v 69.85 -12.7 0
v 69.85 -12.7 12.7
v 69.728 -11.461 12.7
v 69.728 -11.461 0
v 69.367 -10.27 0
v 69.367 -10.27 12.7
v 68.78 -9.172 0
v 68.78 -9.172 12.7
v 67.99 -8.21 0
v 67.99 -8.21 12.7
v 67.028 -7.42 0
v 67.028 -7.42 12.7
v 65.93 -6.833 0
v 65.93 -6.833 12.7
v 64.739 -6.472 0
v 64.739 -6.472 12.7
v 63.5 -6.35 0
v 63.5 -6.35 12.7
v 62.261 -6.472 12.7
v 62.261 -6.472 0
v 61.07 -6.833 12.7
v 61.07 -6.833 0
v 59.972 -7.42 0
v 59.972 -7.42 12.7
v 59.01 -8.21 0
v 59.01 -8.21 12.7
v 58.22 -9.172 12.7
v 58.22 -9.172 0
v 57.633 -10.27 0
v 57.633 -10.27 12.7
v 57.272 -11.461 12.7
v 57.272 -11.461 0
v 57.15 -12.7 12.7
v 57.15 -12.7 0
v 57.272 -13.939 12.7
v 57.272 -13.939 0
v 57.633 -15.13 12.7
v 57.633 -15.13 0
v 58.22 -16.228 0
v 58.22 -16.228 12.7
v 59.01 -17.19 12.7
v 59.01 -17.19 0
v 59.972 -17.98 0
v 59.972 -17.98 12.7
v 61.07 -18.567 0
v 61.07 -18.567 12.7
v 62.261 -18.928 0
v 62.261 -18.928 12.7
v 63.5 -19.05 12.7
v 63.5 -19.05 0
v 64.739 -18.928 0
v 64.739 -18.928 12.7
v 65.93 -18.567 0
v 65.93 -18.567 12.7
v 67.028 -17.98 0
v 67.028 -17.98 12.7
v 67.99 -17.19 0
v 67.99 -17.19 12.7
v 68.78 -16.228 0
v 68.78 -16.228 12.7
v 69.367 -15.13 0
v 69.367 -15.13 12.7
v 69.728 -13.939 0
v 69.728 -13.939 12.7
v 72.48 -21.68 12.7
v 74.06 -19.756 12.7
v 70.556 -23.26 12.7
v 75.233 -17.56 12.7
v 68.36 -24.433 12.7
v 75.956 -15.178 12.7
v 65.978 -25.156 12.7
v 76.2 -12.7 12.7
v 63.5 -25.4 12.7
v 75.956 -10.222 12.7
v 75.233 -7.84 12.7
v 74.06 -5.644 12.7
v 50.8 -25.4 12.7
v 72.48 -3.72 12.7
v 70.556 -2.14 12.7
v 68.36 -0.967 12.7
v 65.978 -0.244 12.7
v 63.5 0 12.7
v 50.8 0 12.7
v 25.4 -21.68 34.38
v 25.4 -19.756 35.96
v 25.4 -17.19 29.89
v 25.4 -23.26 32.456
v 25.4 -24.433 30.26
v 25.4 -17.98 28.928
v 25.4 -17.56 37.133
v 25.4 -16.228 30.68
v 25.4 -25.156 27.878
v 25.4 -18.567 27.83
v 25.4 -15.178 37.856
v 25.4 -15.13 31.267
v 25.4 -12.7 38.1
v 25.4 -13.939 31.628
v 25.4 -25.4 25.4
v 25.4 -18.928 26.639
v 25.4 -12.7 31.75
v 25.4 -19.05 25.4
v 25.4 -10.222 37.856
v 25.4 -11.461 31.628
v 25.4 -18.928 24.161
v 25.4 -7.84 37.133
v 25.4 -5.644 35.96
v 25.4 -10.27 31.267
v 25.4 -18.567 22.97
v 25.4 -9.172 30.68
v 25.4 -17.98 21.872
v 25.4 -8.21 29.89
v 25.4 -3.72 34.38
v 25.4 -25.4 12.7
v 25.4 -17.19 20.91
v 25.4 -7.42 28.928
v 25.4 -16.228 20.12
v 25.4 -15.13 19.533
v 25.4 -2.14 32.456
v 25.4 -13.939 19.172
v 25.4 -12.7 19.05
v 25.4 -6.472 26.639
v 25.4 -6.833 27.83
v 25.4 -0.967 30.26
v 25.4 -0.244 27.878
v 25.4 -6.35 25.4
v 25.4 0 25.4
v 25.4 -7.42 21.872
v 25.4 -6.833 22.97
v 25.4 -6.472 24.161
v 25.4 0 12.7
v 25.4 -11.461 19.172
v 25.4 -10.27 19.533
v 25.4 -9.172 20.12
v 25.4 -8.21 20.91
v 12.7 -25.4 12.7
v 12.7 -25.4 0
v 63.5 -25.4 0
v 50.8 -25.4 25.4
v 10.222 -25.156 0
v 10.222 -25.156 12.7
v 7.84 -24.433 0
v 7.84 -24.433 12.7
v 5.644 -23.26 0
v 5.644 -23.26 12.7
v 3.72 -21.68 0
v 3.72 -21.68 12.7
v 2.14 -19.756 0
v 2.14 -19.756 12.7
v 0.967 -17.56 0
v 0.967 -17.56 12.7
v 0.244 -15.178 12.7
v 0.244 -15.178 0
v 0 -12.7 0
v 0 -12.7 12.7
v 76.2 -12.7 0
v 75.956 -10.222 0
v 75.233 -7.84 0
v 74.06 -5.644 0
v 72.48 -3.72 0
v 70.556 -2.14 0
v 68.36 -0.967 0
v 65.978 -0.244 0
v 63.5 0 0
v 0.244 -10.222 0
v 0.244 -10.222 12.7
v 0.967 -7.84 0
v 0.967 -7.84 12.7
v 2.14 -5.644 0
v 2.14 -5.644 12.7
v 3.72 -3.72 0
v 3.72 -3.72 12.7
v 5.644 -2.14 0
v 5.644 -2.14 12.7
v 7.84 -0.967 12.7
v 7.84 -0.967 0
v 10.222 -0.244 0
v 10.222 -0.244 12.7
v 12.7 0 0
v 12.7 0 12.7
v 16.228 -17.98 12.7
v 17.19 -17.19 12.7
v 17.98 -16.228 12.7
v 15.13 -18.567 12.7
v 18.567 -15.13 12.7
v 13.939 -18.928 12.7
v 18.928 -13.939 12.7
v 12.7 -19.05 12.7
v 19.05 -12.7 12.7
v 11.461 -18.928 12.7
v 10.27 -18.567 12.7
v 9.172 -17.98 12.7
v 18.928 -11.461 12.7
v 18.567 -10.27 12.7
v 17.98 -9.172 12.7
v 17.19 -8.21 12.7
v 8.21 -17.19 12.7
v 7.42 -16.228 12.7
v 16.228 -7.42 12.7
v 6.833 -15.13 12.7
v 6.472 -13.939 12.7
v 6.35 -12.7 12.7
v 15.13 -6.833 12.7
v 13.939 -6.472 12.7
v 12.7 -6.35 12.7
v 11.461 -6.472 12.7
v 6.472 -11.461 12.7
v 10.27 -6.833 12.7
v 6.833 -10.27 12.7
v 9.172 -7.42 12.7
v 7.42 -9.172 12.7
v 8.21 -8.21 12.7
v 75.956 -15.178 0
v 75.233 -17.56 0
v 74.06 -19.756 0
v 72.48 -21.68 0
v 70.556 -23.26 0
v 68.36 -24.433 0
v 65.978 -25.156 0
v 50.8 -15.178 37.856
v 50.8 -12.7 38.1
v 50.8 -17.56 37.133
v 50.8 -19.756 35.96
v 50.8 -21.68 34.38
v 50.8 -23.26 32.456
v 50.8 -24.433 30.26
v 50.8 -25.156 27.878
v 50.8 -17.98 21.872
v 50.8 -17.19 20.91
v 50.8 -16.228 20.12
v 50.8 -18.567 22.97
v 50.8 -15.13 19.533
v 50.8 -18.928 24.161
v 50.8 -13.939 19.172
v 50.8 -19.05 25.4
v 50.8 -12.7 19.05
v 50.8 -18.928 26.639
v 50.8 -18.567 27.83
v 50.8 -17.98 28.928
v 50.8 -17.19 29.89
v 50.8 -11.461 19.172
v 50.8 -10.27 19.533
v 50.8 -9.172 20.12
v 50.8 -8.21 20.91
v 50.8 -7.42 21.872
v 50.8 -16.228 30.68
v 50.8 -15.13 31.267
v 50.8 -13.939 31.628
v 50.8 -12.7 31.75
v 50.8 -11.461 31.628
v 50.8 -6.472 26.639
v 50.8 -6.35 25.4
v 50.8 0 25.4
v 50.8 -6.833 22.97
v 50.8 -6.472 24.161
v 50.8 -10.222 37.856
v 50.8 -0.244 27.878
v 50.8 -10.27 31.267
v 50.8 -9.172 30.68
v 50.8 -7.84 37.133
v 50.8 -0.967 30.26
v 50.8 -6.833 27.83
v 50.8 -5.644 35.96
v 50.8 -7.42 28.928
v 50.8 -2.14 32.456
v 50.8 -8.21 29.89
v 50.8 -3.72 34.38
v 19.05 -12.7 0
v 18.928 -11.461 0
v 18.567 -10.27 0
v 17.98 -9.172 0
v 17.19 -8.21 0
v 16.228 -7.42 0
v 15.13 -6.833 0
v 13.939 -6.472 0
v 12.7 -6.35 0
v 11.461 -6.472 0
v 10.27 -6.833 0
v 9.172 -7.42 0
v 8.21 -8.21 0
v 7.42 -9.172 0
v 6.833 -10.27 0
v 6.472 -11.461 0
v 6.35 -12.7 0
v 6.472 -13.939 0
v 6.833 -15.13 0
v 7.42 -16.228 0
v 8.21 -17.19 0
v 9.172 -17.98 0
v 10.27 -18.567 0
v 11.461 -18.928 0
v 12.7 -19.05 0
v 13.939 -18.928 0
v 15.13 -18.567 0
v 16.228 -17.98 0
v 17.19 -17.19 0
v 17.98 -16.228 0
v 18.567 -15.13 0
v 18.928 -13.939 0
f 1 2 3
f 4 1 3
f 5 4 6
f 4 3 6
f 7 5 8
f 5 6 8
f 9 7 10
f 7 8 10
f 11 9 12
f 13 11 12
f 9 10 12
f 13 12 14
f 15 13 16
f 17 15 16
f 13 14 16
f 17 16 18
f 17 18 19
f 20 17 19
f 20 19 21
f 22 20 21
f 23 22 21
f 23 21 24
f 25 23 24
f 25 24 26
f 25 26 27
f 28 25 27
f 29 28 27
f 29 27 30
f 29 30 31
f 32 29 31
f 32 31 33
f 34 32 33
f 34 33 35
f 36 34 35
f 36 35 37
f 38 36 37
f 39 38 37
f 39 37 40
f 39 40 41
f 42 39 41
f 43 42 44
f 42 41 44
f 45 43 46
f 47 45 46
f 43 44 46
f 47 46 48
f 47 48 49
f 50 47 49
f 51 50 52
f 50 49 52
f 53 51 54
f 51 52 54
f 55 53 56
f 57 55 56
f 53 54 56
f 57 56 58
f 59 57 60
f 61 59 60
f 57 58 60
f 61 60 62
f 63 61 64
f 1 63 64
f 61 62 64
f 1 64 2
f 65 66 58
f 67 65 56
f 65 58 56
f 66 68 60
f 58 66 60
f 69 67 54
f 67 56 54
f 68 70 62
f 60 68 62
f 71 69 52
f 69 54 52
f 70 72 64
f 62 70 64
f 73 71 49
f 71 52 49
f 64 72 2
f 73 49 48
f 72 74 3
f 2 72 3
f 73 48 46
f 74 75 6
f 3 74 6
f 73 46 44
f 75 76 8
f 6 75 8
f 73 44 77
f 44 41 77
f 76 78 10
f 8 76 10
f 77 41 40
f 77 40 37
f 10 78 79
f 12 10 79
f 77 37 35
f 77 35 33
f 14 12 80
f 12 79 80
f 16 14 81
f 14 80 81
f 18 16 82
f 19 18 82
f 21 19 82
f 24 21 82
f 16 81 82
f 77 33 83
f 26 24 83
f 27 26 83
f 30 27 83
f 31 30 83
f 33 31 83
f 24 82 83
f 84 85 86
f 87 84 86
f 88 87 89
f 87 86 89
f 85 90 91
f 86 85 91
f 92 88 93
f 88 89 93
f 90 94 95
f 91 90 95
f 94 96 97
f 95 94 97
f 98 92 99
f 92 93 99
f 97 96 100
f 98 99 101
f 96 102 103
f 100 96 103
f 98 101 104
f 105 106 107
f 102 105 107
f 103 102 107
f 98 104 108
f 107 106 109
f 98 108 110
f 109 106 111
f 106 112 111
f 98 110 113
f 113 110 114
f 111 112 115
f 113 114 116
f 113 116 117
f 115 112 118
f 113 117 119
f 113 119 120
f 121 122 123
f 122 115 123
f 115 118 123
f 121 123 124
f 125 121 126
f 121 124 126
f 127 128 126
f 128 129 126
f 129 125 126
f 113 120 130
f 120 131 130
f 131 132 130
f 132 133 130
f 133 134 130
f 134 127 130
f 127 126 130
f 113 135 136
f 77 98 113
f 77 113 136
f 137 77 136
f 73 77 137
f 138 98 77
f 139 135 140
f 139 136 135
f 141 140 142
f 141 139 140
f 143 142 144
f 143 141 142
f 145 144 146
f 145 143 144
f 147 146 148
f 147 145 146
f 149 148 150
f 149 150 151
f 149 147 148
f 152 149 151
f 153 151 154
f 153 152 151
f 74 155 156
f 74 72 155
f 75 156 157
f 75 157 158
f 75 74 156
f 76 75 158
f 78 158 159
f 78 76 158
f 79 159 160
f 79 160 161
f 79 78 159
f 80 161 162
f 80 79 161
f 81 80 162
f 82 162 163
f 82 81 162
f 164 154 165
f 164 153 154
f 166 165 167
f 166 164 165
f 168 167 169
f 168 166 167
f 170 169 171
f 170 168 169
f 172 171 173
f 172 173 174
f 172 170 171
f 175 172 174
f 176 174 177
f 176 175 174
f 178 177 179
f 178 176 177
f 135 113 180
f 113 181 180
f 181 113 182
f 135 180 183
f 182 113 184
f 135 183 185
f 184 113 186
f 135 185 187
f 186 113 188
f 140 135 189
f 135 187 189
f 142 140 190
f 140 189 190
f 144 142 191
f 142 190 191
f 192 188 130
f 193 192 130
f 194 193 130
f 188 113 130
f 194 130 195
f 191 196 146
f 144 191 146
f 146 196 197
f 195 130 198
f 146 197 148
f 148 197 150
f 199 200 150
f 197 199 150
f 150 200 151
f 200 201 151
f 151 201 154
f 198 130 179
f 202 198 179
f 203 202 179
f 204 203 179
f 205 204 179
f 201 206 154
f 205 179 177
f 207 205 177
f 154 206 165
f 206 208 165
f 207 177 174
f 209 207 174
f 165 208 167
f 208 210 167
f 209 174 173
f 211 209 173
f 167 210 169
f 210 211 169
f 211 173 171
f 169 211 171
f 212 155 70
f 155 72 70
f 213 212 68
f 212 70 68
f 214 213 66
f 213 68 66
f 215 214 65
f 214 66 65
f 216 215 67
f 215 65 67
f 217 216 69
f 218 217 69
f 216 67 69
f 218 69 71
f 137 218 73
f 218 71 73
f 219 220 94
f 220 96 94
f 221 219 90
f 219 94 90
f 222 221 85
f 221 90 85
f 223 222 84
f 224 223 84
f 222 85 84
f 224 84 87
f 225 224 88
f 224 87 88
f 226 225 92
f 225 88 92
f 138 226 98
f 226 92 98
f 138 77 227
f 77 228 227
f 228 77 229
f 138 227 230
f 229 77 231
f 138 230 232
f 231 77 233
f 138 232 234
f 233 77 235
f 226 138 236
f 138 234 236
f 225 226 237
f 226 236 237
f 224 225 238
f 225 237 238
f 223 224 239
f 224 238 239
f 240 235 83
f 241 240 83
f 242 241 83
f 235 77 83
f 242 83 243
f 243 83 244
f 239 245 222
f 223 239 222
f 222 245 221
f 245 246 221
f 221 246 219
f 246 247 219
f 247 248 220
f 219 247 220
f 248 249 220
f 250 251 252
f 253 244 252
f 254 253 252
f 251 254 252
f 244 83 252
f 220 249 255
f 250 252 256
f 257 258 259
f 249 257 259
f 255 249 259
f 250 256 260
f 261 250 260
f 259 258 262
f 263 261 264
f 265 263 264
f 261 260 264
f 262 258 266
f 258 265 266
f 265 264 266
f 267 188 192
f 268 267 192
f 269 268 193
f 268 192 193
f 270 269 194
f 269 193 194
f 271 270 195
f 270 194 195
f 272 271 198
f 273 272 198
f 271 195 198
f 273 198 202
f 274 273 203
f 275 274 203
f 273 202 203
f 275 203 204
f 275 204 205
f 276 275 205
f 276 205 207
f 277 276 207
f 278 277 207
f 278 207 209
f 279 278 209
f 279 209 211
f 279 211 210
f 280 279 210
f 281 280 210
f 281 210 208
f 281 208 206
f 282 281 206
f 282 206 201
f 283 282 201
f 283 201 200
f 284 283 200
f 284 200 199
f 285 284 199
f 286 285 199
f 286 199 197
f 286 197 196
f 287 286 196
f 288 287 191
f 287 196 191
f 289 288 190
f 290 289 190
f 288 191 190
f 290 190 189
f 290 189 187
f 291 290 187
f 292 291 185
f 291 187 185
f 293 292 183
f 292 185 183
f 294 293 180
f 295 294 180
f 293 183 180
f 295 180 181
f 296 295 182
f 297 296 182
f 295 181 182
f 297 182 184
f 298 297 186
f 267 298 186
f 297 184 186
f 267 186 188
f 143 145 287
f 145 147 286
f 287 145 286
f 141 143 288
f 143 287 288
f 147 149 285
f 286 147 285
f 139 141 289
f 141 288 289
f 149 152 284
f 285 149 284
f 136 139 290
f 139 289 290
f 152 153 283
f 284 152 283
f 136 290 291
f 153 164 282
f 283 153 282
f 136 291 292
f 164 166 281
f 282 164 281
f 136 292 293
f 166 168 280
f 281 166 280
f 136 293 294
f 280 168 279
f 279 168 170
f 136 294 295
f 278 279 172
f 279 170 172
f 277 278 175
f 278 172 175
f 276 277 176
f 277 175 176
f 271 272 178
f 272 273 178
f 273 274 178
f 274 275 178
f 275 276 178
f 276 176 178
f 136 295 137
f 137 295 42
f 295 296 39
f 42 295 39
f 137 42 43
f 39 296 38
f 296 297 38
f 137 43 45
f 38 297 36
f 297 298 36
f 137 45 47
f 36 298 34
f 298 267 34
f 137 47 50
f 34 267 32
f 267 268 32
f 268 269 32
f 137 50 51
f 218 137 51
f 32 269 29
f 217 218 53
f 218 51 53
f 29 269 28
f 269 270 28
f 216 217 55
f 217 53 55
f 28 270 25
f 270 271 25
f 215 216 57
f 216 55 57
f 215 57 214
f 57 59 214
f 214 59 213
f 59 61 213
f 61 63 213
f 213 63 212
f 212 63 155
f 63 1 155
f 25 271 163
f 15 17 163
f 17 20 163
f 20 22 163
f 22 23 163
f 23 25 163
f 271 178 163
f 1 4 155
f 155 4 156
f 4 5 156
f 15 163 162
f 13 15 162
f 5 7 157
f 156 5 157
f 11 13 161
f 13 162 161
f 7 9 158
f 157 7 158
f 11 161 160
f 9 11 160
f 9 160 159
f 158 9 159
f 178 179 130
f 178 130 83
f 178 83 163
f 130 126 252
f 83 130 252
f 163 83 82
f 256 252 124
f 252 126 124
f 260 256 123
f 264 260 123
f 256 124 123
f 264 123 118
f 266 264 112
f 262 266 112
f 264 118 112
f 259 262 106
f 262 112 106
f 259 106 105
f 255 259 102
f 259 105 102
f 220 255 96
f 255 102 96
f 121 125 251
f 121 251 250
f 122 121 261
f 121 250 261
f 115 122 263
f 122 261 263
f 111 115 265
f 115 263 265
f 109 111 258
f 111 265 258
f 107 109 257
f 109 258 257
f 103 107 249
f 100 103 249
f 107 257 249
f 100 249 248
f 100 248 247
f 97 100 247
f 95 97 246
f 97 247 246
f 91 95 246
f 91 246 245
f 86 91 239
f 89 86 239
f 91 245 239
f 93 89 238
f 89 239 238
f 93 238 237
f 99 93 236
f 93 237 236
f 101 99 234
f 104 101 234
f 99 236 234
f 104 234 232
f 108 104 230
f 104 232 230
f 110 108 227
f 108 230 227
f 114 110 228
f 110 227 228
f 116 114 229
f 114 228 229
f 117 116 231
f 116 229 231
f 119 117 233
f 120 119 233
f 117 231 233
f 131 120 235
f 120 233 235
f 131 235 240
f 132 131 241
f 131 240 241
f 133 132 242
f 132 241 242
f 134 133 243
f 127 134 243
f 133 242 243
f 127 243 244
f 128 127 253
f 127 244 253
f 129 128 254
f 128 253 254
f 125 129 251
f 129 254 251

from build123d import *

# Parameters (mm, degrees)
F1_DEPTH  = 25.4
F2_R      = 12.7
F3_R      = 12.69999
F4_R      = 12.7
F5_R      = 12.69999
F6_R      = 12.7
F7_R      = 12.69999
F8_R      = 6.35
F9_DEPTH  = 25.4
F10_R     = 6.35
F11_DEPTH = 25.4
F12_R     = 6.35
F13_DEPTH = 25.4


# Not quite as in the source:
# - a fillet or chamfer is up to 0.001 mm smaller than in the source, because OpenCascade refuses the exact size


with BuildPart() as f1:
    # F0 (on Front) → F1 (new body)
    with BuildSketch(Plane.XZ):
        Polygon((0, 12.7), (0, 0), (76.2, 0), (76.2, 12.7), (50.8, 12.7), (50.8, 38.1), (25.4, 38.1), (25.4, 12.7), align=None)
    extrude(amount=F1_DEPTH)

    # F2
    f2_edges = [f1.edges().sort_by_distance(p)[0] for p in [
        (76.2, -25.4, 6.35),
    ]]
    fillet(f2_edges, radius=F2_R)

    # F3 (radius 12.7 in the source; OpenCascade refuses exactly that, so slightly less here)
    f3_edges = [f1.edges().sort_by_distance(p)[0] for p in [
        (76.2, 0, 6.35),
    ]]
    fillet(f3_edges, radius=F3_R)

    # F4
    f4_edges = [f1.edges().sort_by_distance(p)[0] for p in [
        (0, -25.4, 6.35),
    ]]
    fillet(f4_edges, radius=F4_R)

    # F5 (radius 12.7 in the source; OpenCascade refuses exactly that, so slightly less here)
    f5_edges = [f1.edges().sort_by_distance(p)[0] for p in [
        (0, 0, 6.35),
    ]]
    fillet(f5_edges, radius=F5_R)

    # F6
    f6_edges = [f1.edges().sort_by_distance(p)[0] for p in [
        (38.1, 0, 38.1),
    ]]
    fillet(f6_edges, radius=F6_R)

    # F7 (radius 12.7 in the source; OpenCascade refuses exactly that, so slightly less here)
    f7_edges = [f1.edges().sort_by_distance(p)[0] for p in [
        (38.1, -25.4, 38.1),
    ]]
    fillet(f7_edges, radius=F7_R)

    # F8 (on face) → F9 (cut)
    with BuildSketch(Plane.YZ.offset(50.8)):
        with Locations((-12.7, 25.4)):
            Circle(F8_R)
    extrude(amount=-F9_DEPTH, mode=Mode.SUBTRACT)

    # F10 (on face) → F11 (cut)
    with BuildSketch(Plane.XY.offset(12.7)):
        with Locations((63.5, -12.7)):
            Circle(F10_R)
    extrude(amount=-F11_DEPTH, mode=Mode.SUBTRACT)

    # F12 (on face) → F13 (cut)
    with BuildSketch(Plane.XY.offset(12.7)):
        with Locations((12.7, -12.7)):
            Circle(F12_R)
    extrude(amount=-F13_DEPTH, mode=Mode.SUBTRACT)


solid = f1.part
